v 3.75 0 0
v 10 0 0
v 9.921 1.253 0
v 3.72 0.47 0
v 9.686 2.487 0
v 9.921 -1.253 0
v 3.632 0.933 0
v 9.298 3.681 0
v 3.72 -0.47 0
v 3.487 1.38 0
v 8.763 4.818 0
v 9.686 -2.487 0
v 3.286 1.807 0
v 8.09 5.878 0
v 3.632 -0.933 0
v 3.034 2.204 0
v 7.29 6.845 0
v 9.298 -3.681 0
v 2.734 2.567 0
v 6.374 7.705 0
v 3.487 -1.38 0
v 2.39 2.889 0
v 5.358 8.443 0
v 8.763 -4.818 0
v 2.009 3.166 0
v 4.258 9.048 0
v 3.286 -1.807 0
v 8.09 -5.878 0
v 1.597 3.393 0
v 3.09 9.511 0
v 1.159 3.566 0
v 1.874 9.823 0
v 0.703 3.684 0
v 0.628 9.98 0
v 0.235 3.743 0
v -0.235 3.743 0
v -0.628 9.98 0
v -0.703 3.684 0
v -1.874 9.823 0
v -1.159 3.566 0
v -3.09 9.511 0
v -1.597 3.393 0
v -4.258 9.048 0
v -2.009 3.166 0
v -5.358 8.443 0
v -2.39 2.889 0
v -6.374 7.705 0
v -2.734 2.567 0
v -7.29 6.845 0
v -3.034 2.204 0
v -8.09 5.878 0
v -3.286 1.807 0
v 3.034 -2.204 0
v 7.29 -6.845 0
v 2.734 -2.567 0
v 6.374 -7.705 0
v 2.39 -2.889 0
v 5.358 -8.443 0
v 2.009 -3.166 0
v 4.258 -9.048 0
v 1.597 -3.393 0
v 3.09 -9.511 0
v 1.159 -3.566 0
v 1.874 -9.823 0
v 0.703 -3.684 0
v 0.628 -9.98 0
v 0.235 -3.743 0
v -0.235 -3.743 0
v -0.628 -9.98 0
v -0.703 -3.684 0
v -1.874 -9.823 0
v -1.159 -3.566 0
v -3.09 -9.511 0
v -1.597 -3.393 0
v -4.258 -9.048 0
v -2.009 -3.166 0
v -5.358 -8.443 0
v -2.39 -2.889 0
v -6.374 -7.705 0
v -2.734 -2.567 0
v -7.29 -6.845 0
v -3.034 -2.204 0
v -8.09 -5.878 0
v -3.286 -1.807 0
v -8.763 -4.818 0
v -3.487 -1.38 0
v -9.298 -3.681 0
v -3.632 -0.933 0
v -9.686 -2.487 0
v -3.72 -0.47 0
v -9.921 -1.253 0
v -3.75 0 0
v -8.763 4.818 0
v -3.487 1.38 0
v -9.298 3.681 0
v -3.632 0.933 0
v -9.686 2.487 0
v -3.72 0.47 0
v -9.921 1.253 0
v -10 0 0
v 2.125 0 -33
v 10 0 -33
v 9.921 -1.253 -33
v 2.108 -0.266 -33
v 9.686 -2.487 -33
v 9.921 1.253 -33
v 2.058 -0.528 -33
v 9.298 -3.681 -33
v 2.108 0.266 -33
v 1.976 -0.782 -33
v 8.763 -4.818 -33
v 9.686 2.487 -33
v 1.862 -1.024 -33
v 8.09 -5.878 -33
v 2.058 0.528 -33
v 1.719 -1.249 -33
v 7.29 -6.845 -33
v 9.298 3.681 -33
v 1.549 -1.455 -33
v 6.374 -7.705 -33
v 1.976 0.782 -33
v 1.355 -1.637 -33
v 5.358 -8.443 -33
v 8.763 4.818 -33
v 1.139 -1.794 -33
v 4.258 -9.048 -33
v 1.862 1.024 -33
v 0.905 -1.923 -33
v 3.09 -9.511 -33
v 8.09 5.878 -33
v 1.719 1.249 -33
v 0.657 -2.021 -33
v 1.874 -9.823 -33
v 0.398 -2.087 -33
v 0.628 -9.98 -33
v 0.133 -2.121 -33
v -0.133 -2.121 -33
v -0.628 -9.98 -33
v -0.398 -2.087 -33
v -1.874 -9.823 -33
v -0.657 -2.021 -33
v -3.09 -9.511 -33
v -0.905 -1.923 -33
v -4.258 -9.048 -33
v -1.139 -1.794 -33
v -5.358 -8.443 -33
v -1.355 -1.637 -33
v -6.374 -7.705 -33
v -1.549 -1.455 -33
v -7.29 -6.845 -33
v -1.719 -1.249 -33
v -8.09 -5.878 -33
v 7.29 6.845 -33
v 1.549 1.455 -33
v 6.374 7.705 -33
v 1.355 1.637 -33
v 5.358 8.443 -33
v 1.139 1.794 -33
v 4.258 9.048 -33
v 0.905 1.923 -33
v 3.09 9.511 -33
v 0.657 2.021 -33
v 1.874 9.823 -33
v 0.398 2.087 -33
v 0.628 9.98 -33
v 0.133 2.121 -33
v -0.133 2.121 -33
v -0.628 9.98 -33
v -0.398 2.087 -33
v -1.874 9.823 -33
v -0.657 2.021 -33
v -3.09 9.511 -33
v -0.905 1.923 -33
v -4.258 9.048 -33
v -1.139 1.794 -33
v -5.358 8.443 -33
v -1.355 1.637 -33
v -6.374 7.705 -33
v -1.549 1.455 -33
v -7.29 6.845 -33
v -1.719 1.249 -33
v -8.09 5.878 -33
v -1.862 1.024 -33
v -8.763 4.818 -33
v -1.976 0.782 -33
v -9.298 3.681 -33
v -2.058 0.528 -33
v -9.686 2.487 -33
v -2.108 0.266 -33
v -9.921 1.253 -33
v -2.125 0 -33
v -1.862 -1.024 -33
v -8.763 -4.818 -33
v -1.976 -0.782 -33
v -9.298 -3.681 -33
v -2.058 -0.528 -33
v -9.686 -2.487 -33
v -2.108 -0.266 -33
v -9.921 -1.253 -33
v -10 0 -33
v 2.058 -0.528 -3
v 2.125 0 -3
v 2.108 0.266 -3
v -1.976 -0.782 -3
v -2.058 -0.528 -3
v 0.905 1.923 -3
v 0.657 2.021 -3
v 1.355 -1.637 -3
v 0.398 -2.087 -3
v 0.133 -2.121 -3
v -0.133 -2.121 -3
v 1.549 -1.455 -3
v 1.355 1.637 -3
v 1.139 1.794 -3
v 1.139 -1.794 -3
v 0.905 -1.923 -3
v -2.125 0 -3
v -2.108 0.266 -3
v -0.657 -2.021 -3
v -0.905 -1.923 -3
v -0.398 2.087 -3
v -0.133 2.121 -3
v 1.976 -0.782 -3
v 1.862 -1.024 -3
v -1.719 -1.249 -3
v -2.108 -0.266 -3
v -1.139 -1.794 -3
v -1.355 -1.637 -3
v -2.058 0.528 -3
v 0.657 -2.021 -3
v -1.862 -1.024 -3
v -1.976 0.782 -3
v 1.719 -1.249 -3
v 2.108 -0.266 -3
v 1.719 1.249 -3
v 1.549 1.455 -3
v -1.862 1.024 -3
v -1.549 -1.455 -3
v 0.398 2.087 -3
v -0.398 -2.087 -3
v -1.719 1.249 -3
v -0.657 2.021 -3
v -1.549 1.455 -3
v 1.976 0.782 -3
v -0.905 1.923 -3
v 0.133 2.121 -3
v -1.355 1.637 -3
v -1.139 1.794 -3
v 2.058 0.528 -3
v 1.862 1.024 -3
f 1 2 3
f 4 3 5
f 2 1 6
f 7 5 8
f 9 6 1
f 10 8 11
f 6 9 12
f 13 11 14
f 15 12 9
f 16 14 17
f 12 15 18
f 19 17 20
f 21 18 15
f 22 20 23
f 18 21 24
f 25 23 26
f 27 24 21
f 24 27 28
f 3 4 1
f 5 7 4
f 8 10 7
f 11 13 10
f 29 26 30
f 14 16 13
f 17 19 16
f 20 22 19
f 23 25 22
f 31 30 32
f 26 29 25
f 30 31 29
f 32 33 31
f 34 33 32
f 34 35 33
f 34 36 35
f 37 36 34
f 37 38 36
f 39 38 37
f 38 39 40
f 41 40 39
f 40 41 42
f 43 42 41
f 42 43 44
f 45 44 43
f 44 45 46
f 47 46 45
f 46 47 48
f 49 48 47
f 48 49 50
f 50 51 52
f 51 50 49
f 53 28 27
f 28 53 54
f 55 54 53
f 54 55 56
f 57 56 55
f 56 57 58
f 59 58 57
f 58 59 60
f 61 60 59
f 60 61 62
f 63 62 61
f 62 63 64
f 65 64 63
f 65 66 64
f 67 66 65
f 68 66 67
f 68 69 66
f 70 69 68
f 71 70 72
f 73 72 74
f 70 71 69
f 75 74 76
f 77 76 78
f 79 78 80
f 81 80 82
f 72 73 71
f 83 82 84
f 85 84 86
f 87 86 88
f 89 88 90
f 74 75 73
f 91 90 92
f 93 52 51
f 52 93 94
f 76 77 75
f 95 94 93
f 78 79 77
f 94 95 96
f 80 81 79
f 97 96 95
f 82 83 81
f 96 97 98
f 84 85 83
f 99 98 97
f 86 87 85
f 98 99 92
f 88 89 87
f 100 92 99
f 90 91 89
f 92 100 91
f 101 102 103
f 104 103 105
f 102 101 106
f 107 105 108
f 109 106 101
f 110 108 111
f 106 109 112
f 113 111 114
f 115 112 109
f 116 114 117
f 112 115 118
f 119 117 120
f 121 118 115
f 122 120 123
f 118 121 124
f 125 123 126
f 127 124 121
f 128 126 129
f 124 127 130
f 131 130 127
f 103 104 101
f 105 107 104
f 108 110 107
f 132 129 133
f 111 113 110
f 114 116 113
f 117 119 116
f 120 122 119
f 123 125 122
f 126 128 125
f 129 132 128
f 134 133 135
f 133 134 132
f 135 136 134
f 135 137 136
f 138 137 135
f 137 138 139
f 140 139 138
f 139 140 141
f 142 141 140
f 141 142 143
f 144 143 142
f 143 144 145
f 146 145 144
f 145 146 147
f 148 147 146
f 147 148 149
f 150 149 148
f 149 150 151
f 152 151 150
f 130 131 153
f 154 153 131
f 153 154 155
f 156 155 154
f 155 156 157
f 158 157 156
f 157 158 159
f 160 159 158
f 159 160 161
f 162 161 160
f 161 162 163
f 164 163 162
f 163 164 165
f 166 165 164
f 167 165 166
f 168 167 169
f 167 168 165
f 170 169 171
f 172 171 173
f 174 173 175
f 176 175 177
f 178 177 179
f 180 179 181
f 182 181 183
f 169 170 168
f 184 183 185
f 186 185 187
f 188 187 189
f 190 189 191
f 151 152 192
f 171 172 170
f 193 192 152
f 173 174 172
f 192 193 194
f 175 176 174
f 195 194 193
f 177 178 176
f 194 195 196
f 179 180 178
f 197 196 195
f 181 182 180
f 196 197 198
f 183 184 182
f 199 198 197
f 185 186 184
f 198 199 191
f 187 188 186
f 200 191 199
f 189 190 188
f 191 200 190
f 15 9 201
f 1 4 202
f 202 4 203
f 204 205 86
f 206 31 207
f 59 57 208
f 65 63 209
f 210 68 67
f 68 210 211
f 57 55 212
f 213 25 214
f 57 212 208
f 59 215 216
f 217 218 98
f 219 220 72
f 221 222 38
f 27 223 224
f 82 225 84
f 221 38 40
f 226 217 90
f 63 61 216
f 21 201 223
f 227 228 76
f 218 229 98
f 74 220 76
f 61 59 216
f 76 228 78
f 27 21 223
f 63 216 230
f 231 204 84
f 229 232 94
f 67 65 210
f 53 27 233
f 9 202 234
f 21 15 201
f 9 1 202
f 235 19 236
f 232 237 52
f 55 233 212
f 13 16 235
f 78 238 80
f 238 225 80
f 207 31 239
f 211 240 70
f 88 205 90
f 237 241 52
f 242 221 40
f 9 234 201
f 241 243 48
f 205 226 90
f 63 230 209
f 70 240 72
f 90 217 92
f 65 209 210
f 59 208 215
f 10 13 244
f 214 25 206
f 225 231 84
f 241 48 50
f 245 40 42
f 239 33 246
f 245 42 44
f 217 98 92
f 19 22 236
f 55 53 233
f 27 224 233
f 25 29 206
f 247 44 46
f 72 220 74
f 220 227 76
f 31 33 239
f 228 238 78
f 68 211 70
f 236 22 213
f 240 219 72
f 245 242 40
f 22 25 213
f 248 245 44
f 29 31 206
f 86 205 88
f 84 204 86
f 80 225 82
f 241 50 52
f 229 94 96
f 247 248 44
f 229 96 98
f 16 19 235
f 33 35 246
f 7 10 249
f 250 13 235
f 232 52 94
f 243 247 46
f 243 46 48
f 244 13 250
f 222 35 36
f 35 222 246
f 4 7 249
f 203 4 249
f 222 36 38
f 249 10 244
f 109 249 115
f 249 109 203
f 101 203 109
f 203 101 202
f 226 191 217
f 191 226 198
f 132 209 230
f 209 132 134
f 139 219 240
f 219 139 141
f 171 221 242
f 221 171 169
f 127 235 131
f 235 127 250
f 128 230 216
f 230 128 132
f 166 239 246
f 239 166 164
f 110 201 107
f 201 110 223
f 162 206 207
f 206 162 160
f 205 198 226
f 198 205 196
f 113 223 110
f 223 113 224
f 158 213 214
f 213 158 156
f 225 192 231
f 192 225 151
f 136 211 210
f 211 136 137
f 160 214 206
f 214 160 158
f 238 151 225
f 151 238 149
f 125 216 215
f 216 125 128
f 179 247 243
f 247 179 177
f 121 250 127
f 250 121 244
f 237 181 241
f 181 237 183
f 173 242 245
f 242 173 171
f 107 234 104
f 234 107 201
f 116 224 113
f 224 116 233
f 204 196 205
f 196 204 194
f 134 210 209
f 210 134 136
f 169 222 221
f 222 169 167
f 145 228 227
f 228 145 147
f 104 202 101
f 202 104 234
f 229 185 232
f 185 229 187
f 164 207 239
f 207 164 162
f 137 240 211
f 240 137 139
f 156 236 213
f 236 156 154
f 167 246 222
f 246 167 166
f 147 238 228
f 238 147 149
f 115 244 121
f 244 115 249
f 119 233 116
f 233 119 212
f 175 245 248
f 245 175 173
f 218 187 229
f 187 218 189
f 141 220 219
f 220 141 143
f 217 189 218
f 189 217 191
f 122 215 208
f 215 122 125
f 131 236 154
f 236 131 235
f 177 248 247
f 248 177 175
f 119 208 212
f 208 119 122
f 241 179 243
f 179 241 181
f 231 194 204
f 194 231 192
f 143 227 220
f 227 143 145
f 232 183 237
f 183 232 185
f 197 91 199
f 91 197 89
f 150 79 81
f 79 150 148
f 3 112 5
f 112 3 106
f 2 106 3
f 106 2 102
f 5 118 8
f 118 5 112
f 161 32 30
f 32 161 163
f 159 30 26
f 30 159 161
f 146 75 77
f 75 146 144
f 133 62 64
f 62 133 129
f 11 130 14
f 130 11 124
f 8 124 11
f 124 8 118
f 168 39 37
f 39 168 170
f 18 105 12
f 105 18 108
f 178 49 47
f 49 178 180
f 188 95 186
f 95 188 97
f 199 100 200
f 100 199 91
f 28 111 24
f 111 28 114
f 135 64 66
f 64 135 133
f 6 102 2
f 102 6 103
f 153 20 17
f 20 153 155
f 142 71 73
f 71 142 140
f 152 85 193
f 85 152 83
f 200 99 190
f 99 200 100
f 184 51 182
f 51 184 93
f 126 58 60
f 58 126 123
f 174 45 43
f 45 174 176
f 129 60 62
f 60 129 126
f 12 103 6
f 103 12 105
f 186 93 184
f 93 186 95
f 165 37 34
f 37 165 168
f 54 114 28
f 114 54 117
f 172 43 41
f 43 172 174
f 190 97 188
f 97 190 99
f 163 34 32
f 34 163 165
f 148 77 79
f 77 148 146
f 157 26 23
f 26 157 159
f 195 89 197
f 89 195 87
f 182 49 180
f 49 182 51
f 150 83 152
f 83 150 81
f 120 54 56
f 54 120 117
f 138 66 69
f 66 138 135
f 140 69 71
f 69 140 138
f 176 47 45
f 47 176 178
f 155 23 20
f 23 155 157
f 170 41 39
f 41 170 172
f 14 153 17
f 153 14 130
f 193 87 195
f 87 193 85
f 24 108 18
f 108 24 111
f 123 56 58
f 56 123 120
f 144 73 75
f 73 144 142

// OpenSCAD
$fn = 50;


difference() {
	union() {
		translate(v = [0, 0, -33.0000000000]) {
			cylinder(h = 33, r = 10.0000000000);
		}
		cylinder(h = 0, r = 16.0000000000);
	}
	union() {
		translate(v = [0, 0, 0]) {
			rotate(a = [0, 0, 0]) {
				difference() {
					union() {
						#translate(v = [0, 0, -33.0000000000]) {
							cylinder(h = 33, r = 2.0000000000);
						}
						#translate(v = [0, 0, -3]) {
							cylinder(h = 3, r1 = 2.1250000000, r2 = 3.7500000000);
						}
						#translate(v = [0, 0, -33.0000000000]) {
							cylinder(h = 33, r = 2.1250000000);
						}
						#translate(v = [0, 0, -33.0000000000]) {
							cylinder(h = 33, r = 2.0000000000);
						}
					}
					union();
				}
			}
		}
	}
}
